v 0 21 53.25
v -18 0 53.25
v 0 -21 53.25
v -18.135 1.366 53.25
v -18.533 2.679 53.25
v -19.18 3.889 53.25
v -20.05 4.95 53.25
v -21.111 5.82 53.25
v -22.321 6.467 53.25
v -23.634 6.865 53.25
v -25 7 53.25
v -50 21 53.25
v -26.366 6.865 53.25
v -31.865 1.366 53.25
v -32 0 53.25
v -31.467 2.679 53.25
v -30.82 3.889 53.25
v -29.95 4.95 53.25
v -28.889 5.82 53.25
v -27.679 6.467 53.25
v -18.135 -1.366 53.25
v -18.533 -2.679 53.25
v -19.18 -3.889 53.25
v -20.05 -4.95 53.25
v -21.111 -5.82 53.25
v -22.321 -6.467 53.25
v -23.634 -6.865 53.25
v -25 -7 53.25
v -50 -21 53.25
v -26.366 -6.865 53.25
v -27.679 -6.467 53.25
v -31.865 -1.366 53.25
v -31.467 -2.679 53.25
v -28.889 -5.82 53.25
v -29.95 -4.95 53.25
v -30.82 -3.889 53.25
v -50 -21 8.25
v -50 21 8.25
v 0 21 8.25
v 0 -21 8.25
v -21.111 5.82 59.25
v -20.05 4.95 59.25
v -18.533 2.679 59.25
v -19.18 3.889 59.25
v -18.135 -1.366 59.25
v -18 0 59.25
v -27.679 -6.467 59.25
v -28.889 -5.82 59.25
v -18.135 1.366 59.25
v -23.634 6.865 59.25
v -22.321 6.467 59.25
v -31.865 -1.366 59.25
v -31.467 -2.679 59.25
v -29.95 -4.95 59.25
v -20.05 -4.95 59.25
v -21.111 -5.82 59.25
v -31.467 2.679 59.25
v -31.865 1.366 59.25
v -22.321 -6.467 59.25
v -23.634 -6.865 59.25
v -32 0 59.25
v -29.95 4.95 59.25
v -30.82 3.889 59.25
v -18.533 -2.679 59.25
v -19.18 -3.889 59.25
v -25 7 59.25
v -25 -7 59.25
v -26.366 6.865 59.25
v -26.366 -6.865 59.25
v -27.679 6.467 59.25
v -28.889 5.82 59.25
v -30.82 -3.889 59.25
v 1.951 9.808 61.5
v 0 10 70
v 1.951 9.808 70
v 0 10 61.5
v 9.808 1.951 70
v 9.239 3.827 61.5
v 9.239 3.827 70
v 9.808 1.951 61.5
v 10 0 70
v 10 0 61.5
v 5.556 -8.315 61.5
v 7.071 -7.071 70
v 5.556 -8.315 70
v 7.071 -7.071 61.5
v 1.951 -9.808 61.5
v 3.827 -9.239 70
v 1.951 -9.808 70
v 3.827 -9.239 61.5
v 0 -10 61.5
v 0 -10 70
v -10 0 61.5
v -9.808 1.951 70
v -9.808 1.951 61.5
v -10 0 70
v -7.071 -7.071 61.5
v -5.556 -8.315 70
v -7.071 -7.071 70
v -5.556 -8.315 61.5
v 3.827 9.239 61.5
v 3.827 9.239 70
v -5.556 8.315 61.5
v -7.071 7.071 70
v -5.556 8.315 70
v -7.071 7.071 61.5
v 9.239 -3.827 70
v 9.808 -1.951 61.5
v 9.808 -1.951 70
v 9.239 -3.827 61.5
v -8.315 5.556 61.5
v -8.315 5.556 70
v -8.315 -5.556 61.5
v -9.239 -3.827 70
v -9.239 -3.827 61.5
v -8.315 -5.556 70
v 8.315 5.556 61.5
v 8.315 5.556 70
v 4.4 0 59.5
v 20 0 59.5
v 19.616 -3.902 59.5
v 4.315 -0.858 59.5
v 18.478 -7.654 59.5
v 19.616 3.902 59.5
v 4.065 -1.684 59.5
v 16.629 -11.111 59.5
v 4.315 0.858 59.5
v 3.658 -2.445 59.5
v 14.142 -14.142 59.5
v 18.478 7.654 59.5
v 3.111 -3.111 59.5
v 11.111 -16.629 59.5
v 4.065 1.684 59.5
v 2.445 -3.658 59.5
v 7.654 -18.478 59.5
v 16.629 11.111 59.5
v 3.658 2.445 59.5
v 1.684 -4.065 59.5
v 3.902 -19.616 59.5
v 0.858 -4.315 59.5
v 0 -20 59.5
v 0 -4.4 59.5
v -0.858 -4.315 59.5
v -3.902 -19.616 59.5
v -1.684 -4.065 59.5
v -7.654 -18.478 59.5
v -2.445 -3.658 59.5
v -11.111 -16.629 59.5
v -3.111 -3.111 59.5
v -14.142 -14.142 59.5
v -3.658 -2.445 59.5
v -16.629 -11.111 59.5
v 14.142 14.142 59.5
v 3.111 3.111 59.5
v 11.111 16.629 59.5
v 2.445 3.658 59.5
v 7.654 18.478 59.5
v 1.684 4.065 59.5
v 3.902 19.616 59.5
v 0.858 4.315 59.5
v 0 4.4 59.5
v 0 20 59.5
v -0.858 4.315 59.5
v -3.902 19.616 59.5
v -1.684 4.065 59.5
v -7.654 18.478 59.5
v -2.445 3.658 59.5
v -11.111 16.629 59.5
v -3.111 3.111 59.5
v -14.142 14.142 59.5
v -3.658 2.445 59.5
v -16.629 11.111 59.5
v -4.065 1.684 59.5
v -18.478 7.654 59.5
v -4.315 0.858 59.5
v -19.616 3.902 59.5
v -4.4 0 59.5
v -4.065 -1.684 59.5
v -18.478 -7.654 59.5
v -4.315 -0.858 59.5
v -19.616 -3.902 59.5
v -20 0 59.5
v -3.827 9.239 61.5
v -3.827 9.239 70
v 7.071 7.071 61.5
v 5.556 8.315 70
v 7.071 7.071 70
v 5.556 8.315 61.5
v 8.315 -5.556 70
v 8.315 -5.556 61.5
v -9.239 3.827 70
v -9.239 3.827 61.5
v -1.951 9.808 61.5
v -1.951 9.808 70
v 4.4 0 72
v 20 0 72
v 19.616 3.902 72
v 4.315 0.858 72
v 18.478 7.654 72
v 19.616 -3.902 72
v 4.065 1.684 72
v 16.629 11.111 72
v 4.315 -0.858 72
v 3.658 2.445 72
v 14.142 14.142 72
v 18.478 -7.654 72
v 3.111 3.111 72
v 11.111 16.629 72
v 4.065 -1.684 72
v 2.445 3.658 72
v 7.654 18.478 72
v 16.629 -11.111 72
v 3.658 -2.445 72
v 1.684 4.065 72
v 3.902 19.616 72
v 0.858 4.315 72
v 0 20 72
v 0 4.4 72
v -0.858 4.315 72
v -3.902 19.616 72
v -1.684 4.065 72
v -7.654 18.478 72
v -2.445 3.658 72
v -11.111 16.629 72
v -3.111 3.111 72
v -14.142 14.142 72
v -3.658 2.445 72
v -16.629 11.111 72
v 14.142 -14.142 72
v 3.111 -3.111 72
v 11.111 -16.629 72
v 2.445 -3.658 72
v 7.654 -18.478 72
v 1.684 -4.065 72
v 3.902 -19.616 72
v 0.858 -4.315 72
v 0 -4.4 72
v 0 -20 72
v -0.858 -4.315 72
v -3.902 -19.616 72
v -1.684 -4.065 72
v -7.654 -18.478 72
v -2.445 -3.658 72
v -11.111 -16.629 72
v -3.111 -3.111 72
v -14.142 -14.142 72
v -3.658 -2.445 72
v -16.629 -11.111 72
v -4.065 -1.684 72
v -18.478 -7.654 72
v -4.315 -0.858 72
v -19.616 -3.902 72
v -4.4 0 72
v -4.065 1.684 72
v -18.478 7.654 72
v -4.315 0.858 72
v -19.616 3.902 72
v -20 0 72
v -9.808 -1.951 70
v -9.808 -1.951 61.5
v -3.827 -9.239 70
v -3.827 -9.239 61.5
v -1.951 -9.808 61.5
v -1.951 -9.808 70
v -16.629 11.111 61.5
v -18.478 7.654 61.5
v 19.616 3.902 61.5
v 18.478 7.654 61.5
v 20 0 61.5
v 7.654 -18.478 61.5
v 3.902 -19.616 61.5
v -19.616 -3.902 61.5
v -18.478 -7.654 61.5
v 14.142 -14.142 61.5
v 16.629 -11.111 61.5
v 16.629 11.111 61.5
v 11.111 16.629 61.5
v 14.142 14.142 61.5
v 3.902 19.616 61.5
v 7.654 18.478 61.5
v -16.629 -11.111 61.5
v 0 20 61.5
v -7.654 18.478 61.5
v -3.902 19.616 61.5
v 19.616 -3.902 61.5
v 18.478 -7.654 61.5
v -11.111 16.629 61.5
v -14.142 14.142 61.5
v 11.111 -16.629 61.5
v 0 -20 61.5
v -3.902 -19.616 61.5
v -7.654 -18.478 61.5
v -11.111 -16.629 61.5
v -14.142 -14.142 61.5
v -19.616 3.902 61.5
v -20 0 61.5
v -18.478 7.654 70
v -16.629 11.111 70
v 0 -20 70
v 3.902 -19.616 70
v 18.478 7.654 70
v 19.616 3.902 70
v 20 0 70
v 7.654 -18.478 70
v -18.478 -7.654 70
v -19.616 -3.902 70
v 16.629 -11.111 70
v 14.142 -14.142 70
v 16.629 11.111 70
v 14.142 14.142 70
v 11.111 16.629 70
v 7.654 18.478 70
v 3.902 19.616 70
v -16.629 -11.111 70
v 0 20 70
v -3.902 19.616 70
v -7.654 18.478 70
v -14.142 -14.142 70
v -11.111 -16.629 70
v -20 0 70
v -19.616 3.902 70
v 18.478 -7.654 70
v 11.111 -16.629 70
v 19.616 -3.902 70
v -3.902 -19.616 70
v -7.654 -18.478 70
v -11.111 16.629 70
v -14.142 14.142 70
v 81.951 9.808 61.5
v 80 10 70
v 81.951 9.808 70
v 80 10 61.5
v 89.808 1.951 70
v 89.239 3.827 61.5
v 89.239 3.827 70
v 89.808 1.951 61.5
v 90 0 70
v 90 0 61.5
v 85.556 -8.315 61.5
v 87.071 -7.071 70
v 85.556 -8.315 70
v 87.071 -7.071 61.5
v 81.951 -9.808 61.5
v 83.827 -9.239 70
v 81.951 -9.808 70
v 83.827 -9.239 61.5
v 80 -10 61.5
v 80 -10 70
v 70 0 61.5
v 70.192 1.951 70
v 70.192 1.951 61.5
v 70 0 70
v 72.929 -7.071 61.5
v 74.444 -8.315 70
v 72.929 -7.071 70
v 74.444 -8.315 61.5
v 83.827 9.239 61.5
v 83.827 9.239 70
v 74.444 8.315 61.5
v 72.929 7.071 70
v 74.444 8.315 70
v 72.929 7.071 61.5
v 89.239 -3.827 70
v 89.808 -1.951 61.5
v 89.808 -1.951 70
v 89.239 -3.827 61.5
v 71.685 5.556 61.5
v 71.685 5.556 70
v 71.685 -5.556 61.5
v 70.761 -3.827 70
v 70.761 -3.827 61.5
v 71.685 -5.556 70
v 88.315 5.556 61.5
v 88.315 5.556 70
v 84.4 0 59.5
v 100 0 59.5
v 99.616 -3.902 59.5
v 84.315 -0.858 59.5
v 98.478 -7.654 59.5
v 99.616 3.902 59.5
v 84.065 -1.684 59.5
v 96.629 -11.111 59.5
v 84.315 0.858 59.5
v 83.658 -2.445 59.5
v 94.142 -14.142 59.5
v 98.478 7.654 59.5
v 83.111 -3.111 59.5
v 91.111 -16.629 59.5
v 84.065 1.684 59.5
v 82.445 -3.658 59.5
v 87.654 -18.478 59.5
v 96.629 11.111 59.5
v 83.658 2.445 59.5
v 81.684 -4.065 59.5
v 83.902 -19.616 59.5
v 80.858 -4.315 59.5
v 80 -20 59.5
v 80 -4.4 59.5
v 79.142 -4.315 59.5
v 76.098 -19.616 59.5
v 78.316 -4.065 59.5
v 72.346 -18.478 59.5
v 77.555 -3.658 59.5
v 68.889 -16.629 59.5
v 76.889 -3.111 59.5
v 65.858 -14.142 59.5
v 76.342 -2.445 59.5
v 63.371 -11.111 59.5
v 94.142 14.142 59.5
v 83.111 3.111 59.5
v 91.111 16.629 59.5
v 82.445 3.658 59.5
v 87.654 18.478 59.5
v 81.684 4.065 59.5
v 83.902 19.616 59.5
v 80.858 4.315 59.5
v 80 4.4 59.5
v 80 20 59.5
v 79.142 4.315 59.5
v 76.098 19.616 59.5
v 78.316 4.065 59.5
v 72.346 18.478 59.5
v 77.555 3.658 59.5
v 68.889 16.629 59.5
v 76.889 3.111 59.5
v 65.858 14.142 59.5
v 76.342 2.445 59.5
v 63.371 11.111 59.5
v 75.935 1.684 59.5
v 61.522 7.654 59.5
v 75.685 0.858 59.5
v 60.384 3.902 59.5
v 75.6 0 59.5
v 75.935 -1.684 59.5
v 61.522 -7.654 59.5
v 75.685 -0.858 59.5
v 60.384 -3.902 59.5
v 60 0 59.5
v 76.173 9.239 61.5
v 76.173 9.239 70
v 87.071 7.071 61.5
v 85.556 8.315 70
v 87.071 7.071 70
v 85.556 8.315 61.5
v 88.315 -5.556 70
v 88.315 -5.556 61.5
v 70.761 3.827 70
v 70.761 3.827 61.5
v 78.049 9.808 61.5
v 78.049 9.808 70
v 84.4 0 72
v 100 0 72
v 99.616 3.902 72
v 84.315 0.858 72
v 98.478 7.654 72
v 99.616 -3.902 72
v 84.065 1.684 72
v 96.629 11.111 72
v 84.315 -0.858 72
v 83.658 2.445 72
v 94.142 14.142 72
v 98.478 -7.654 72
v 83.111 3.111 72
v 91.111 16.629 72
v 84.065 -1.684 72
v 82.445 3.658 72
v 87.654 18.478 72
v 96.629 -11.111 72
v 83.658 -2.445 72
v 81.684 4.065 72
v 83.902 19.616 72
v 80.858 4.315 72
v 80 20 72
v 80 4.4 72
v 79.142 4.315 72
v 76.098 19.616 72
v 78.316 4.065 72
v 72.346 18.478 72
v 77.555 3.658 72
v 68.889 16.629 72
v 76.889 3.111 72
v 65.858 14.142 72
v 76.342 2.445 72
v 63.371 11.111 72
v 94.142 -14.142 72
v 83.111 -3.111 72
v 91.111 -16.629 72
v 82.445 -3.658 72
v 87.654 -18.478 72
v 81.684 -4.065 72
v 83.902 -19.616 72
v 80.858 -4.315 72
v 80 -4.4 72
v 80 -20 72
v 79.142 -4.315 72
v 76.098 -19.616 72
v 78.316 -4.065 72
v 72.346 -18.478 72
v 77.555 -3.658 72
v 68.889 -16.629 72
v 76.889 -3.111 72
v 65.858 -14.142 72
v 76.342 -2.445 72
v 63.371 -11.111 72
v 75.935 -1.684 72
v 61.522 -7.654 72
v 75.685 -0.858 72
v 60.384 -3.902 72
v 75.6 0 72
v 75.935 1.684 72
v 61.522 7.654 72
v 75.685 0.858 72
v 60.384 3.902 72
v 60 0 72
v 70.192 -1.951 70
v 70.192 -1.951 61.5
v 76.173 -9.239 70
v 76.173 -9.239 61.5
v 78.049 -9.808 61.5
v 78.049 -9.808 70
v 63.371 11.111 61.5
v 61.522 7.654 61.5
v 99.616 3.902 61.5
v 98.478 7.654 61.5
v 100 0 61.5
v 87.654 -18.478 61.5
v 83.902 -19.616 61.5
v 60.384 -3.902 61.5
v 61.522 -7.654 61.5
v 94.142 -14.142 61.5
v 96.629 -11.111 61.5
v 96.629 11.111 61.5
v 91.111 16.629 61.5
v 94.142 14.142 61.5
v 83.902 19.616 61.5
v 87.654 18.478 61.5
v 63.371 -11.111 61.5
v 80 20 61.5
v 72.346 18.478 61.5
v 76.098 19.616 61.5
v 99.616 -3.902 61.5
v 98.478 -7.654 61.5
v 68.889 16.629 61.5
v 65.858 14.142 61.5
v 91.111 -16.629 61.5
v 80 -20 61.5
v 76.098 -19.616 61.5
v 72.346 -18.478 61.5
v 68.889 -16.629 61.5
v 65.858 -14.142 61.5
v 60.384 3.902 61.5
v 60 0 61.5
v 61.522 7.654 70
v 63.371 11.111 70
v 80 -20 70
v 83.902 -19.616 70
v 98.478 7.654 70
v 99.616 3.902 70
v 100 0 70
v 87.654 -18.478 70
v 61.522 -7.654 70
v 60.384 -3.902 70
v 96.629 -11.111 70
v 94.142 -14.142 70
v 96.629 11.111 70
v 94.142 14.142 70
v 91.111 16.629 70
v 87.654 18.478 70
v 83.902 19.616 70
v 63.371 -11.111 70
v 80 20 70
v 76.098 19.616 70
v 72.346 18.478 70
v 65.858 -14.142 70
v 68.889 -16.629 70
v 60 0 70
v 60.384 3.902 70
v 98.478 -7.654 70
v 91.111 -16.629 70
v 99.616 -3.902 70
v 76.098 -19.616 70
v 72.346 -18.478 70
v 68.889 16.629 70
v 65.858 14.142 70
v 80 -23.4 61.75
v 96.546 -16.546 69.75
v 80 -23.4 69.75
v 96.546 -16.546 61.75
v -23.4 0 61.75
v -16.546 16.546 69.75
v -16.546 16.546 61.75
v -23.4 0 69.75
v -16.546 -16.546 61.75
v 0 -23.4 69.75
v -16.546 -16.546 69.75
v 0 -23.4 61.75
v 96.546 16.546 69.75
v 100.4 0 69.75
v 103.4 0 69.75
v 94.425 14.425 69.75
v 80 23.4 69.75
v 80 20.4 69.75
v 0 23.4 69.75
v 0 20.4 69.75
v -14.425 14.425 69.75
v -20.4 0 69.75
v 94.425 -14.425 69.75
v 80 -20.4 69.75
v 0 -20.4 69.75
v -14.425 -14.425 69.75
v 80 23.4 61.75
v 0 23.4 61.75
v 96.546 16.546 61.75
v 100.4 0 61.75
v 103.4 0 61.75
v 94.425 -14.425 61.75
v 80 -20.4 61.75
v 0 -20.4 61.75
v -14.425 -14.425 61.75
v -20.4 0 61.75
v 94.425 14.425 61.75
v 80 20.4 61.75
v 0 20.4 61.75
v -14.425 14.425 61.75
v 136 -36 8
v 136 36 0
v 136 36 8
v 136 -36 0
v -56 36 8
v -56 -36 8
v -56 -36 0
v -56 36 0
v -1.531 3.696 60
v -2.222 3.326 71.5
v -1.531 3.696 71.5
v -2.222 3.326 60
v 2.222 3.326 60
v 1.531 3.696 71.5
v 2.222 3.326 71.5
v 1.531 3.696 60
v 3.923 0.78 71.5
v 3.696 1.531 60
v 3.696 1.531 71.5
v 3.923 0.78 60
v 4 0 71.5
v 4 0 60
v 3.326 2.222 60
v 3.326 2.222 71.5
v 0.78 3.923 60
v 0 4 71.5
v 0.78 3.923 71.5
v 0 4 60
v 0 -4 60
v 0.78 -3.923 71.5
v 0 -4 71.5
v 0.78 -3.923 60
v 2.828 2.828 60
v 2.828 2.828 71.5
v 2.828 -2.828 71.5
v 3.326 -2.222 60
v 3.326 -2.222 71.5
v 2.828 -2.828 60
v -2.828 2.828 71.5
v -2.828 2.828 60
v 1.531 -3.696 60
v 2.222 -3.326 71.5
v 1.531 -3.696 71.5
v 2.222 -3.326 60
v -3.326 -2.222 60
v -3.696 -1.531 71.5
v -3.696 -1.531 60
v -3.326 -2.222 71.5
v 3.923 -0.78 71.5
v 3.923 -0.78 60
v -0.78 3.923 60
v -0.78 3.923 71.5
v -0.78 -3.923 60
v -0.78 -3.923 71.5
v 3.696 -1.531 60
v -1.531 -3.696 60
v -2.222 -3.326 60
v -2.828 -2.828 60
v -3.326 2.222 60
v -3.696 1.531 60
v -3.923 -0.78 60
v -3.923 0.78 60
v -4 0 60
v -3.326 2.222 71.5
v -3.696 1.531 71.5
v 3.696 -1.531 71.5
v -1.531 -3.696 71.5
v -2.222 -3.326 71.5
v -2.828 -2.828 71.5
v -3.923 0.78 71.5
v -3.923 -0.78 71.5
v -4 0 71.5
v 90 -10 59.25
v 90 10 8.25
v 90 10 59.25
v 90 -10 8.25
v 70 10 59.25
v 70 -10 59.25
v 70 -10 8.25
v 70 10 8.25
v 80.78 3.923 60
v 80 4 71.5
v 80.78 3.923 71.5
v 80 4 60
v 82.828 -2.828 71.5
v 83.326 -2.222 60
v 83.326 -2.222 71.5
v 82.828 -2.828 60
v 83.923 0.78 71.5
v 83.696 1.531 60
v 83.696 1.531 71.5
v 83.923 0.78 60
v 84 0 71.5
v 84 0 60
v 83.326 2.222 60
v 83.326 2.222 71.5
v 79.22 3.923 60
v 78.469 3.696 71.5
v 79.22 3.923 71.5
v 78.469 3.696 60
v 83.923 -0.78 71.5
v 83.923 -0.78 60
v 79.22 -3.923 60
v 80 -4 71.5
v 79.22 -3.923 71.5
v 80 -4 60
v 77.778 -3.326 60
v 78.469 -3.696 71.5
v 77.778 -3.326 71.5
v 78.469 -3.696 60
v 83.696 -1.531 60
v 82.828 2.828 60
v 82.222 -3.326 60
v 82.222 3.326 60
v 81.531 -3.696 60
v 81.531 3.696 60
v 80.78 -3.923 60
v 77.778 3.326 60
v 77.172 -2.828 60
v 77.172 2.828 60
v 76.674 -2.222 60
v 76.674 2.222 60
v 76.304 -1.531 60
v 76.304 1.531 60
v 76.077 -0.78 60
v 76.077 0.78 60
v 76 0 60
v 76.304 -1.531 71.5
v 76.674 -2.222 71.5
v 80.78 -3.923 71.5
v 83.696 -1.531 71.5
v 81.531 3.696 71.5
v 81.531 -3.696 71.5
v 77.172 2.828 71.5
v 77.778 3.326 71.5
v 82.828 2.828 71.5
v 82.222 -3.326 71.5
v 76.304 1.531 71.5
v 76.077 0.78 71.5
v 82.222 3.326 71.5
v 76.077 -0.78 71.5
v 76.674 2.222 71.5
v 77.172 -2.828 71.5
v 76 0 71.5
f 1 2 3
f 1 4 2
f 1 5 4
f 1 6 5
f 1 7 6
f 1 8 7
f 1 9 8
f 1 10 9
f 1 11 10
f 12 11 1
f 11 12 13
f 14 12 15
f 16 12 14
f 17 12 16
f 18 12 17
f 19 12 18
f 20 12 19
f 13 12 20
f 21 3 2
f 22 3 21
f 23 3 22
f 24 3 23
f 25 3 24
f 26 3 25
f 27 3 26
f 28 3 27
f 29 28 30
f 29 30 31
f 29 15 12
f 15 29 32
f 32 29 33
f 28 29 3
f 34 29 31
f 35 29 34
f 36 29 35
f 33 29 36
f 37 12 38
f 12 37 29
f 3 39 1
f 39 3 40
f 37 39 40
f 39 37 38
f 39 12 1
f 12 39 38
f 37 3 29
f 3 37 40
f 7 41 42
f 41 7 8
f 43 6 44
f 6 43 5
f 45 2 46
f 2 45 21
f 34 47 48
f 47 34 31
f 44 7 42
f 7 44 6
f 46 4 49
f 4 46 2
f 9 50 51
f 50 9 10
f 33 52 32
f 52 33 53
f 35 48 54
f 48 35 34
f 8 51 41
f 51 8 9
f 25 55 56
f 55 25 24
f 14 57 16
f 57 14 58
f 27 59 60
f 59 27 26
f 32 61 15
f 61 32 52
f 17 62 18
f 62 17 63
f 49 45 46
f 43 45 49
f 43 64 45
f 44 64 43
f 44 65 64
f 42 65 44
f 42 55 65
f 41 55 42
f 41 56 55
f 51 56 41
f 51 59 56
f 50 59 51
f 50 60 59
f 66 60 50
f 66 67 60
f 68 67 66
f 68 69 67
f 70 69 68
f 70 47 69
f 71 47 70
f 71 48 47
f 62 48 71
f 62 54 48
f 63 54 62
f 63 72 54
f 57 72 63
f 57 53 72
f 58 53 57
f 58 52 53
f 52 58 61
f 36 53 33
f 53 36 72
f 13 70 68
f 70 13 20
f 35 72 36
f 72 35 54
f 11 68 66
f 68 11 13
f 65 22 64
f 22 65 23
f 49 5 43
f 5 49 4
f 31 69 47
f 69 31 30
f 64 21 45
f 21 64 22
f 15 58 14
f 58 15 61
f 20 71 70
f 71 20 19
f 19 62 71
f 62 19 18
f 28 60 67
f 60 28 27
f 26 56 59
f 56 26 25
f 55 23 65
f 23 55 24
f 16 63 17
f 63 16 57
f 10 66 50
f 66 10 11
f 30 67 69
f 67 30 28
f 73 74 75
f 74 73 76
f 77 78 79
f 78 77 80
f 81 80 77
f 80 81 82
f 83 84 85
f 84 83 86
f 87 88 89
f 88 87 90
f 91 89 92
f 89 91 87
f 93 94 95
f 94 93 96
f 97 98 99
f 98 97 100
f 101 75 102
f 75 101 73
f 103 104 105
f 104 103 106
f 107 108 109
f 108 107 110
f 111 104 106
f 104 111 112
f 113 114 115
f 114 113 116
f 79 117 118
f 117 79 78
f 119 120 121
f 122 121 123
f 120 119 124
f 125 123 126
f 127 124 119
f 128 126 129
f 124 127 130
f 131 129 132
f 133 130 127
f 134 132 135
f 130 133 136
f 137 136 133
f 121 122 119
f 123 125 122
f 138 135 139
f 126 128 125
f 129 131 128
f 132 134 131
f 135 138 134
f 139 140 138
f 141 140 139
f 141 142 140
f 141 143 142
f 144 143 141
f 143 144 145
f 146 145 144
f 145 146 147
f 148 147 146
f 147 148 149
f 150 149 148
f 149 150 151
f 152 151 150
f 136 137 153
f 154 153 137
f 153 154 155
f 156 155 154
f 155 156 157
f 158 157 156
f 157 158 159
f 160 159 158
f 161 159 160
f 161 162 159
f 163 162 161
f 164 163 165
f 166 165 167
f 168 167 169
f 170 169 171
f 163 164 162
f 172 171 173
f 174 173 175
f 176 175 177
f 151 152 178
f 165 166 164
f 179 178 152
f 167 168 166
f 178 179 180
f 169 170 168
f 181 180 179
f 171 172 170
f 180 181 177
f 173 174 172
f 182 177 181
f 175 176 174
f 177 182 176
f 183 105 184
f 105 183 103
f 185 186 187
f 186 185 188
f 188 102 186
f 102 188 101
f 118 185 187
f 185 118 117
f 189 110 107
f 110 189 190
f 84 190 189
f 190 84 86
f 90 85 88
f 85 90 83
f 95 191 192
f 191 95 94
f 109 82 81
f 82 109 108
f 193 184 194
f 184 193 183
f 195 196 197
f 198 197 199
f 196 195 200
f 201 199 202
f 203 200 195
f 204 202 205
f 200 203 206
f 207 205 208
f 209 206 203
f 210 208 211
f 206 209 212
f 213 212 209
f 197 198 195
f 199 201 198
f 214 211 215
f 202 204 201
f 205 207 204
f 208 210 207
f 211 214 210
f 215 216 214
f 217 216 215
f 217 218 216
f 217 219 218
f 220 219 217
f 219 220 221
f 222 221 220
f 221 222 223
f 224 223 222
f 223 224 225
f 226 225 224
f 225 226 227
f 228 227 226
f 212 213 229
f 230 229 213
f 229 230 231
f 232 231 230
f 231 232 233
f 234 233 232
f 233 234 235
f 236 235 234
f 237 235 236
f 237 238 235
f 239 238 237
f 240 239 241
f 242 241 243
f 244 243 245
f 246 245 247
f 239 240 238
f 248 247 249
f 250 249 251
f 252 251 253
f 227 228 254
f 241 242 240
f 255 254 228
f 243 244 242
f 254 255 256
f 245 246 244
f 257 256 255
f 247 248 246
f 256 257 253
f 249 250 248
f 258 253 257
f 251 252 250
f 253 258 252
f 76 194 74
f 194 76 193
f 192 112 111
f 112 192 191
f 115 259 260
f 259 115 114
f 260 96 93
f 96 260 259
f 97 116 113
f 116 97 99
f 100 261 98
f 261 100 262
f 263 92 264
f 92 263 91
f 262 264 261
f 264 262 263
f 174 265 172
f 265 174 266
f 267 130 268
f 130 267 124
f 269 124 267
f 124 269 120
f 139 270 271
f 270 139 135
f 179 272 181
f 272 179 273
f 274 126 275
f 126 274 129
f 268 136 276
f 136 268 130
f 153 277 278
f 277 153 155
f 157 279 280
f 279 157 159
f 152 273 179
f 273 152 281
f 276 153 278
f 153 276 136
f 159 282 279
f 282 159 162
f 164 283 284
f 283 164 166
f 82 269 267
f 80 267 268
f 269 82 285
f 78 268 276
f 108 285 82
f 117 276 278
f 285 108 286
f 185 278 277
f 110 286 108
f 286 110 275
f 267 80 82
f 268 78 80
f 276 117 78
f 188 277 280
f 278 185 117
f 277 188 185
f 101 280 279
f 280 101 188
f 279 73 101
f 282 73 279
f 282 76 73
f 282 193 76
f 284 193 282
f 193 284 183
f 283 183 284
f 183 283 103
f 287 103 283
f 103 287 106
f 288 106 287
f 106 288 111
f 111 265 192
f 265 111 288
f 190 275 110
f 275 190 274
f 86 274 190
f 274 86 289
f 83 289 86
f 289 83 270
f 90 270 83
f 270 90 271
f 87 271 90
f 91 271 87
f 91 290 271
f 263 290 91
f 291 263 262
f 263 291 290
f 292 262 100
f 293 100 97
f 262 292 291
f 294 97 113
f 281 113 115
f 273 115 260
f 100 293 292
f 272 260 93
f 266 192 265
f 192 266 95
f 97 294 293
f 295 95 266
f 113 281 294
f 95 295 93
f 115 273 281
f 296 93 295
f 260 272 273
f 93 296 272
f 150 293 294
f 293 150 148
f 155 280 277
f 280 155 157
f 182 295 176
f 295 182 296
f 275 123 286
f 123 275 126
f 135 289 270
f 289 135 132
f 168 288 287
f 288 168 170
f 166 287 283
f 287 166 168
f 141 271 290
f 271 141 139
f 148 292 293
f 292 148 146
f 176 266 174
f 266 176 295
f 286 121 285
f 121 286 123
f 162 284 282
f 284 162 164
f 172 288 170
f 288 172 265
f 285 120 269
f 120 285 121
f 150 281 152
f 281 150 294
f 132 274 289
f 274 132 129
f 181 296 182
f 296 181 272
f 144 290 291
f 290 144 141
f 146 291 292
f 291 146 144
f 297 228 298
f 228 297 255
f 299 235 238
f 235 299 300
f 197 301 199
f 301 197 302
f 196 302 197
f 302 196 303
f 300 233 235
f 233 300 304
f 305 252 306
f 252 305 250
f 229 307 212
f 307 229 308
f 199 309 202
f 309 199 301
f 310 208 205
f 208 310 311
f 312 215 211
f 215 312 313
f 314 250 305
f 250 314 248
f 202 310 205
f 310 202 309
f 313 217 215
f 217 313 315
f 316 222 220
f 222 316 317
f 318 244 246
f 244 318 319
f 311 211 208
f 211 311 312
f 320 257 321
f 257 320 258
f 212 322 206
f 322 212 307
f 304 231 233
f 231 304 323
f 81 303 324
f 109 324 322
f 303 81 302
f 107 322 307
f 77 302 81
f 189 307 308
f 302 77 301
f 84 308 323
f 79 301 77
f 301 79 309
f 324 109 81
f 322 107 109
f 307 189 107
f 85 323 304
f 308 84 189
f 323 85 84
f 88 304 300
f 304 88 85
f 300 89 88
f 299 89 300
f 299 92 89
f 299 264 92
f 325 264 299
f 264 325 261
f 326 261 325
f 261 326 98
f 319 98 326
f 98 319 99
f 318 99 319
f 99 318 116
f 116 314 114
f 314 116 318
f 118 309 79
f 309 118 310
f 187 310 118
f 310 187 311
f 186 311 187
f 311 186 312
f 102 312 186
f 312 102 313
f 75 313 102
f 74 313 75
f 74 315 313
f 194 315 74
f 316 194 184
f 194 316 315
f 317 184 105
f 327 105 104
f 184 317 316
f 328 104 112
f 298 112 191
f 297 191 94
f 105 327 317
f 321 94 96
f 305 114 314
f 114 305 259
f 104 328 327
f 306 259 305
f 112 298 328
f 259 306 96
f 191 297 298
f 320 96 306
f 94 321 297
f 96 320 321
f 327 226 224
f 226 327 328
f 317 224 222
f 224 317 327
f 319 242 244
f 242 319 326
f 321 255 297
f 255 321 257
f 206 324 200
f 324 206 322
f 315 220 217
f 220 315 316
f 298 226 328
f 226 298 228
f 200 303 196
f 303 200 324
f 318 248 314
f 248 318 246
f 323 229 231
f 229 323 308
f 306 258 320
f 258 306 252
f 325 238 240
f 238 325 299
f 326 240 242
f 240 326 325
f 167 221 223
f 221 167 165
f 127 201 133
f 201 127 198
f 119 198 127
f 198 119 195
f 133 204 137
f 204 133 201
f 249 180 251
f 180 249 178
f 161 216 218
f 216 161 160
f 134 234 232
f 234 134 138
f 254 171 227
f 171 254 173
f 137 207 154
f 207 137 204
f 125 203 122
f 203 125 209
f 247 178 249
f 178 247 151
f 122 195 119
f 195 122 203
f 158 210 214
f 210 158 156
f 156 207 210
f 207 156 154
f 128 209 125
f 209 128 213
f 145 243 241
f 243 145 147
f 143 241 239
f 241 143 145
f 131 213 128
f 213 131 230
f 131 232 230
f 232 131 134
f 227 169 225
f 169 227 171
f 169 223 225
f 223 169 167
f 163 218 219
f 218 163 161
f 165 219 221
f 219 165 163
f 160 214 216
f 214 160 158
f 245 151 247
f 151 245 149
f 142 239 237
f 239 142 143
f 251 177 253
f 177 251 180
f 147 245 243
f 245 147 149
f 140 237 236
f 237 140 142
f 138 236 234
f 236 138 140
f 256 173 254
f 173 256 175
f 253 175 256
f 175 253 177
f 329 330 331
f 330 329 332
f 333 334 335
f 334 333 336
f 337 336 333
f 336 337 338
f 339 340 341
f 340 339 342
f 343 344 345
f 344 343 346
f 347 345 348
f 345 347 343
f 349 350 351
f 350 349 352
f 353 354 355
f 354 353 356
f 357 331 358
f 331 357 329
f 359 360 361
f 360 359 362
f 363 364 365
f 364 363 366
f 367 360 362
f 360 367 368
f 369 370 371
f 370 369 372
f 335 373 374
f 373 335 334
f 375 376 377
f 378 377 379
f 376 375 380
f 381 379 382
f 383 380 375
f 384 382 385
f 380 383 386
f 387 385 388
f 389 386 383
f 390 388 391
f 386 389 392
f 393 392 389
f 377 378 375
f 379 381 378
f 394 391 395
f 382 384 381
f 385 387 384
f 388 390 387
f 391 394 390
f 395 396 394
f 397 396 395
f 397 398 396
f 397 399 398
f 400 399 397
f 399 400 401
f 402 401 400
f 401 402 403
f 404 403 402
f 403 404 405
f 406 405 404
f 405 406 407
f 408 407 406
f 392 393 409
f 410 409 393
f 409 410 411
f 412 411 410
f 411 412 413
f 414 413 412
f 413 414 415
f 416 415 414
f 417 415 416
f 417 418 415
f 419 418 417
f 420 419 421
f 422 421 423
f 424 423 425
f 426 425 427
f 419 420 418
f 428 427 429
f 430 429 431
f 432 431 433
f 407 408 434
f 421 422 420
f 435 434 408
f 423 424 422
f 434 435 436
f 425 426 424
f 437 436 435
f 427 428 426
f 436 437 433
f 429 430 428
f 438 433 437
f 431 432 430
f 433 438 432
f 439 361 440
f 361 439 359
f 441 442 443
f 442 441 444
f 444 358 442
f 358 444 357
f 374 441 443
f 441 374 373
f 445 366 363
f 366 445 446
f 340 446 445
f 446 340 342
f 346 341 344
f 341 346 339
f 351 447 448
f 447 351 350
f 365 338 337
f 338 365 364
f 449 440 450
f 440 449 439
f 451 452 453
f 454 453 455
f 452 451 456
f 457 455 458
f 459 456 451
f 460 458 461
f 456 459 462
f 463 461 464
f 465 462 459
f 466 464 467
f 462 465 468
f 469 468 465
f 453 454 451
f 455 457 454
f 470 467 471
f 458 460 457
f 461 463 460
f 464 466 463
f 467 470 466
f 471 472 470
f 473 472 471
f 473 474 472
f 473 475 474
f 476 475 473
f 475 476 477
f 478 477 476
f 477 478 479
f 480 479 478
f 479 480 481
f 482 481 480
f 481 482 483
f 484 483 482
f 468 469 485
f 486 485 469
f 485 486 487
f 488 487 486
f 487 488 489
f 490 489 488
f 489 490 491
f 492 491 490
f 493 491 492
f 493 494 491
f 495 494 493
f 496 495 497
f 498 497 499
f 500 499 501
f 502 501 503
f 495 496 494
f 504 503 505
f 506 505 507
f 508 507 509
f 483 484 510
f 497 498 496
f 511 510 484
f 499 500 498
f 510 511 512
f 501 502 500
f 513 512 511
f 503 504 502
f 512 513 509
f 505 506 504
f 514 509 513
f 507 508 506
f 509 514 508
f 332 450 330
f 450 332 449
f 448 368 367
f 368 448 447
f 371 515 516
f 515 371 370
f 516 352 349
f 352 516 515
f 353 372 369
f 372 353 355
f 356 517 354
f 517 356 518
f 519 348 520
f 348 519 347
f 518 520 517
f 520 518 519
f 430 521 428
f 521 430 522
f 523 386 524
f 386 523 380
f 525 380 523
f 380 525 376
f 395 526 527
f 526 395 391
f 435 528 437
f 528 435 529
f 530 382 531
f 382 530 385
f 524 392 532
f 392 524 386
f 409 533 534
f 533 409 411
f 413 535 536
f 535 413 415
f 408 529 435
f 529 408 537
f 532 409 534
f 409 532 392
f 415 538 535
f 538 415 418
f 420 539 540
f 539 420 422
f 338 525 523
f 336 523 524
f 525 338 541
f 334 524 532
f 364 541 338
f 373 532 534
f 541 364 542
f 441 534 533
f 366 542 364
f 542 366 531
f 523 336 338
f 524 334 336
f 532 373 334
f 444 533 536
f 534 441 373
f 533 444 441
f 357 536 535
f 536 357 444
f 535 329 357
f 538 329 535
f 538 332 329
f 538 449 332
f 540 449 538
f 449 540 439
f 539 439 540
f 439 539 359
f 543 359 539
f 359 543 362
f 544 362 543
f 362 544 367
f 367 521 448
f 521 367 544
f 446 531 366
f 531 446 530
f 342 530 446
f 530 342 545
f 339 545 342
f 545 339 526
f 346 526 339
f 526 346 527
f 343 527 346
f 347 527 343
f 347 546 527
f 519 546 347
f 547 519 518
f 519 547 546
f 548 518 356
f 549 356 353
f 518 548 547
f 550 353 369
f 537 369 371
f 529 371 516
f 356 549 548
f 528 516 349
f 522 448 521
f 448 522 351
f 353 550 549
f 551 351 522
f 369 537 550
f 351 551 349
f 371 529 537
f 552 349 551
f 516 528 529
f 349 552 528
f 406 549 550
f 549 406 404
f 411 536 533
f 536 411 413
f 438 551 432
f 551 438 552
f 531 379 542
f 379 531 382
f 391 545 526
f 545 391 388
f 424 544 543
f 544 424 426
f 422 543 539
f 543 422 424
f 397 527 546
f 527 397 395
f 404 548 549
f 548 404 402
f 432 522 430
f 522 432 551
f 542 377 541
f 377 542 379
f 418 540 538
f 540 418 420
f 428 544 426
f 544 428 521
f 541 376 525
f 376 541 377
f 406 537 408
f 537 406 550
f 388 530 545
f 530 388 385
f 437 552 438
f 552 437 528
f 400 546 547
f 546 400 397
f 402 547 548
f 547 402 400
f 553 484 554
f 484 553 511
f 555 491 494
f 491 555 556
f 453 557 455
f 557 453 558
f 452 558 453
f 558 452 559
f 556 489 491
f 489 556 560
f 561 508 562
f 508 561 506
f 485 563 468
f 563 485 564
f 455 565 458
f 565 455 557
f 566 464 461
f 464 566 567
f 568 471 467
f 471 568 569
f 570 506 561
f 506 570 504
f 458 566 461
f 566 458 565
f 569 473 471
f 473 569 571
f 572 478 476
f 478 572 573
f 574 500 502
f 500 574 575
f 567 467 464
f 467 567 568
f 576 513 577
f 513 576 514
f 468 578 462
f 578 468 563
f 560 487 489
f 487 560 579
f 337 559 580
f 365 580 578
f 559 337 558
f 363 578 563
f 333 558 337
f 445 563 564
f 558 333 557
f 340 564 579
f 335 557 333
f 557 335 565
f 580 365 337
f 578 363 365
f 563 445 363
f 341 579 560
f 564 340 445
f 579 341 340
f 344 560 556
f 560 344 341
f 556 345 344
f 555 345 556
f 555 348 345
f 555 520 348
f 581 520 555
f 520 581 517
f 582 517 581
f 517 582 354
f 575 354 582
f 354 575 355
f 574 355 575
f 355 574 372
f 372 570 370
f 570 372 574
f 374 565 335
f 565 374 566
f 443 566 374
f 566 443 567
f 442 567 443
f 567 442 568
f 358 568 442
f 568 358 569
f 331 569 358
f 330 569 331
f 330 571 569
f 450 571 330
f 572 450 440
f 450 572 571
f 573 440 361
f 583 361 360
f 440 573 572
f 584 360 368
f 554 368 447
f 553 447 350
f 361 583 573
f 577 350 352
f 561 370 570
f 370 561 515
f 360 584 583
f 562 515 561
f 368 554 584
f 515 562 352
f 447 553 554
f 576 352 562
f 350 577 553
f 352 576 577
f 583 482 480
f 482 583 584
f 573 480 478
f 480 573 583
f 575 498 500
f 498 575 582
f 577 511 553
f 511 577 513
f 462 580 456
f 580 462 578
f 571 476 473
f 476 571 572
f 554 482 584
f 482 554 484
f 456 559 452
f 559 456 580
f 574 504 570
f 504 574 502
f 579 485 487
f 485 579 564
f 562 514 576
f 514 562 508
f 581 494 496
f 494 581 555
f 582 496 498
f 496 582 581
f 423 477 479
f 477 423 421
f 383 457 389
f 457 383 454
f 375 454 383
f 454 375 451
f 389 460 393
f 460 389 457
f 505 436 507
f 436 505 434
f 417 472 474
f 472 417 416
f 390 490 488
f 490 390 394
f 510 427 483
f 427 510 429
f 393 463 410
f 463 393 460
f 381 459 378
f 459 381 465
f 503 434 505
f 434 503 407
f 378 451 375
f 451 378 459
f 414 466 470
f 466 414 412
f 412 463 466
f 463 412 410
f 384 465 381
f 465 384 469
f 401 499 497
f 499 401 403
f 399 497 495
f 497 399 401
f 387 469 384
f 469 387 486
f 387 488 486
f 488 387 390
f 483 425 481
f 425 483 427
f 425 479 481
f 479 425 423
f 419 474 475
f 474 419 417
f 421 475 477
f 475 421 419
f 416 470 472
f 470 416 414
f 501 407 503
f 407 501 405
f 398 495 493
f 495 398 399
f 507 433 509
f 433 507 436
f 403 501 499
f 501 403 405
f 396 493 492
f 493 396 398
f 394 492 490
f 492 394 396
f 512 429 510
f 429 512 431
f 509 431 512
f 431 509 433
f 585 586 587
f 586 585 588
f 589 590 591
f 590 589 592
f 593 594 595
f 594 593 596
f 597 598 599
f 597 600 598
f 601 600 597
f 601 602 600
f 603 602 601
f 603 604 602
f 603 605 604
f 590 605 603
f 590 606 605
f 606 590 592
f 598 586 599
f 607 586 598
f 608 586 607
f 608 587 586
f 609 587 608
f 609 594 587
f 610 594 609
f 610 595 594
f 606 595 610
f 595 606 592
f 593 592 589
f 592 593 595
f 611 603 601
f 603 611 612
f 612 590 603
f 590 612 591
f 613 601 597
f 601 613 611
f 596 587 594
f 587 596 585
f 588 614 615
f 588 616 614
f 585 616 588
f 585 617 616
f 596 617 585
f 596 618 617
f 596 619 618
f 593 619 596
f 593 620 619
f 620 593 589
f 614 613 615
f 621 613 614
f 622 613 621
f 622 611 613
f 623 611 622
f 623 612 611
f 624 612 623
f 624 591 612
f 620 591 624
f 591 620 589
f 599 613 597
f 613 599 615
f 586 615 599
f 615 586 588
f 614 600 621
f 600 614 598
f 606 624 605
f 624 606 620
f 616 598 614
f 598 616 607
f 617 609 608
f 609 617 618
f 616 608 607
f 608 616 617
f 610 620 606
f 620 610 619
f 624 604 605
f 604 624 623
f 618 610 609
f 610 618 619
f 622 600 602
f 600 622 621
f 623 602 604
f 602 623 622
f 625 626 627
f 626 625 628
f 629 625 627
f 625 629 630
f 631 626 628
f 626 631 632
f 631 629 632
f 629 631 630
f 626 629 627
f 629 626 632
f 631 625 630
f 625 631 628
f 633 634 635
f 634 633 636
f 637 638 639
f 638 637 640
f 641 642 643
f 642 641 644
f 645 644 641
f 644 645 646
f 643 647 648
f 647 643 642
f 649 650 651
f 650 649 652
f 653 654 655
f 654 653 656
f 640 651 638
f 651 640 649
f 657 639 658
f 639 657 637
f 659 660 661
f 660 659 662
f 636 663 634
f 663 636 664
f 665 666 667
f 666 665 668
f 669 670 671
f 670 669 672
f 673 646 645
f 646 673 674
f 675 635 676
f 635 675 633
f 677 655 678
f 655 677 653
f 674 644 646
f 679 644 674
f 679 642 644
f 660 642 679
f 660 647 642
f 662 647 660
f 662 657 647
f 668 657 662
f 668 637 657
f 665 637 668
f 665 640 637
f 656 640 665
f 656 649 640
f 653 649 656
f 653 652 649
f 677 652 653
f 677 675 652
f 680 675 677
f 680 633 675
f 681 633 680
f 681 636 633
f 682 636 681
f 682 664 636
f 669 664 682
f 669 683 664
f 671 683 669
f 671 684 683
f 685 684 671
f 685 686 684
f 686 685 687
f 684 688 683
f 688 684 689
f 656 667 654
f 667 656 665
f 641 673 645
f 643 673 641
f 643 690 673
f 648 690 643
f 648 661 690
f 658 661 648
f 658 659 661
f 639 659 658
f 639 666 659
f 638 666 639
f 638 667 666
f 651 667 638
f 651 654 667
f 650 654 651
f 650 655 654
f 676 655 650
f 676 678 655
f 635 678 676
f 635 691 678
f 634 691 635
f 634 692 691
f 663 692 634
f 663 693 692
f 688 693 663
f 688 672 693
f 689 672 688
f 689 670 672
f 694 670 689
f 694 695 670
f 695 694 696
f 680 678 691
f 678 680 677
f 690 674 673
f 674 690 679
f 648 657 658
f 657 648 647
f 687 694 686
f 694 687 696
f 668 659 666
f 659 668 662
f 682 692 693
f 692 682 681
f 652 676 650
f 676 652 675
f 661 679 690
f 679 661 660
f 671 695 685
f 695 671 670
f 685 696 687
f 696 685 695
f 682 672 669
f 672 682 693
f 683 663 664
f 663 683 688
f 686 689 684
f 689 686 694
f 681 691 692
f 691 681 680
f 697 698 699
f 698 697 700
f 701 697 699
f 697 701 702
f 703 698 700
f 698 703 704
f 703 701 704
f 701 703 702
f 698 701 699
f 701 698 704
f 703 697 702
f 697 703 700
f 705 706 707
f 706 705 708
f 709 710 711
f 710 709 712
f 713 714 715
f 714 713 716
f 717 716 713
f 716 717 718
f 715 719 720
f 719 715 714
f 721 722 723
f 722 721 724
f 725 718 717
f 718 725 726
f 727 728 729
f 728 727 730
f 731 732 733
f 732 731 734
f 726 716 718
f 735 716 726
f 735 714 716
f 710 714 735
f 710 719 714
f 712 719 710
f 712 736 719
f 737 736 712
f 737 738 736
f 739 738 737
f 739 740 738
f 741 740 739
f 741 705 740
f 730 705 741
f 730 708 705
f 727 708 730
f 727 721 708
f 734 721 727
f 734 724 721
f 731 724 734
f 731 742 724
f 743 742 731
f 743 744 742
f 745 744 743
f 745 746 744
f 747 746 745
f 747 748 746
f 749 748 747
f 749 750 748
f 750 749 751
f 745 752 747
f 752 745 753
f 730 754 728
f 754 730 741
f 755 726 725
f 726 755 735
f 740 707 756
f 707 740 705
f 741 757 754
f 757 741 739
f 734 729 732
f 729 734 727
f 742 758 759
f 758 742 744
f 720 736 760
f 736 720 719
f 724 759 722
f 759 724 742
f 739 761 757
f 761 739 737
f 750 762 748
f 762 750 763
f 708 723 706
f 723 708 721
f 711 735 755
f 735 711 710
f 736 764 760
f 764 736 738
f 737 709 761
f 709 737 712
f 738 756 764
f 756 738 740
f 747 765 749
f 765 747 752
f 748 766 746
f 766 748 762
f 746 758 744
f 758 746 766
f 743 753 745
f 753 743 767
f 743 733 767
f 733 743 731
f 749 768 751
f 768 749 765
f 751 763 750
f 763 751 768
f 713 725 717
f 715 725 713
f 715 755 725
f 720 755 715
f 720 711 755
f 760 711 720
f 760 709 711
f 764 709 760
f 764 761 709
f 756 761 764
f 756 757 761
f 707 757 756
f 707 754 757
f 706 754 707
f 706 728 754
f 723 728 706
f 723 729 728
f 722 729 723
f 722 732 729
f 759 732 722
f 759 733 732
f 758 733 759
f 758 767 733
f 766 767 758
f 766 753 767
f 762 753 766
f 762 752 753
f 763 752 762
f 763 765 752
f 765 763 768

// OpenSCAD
$fn = 32;

// ------------------------------------------------------------------------
// Motor belt drive: span 80 mm, pulleys d40, belt 8 mm wide
// Every part is its own module, assembly() places every instance.
// ------------------------------------------------------------------------

// --- part 1 ---
module base_plate() {
  difference() {
    translate([-96, -36, 0]) cube([192, 72, 8]);
  }
}

// --- part 2 ---
module motor() {
  union() {
    translate([-22.5, -21, 0]) cube([45, 42, 50]);
    translate([25.5, 0, 25]) rotate([0, 90, 0]) cylinder(h = 6, d = 14, center = true);
  }
}

// --- part 3 ---
module drive_shaft() {
  translate([0, 0, -5.75]) cylinder(h = 11.5, d = 8);
}

// --- part 4 ---
module pulley_drive() {
  difference() {
    union() {
      cylinder(h = 12.5, d = 20);
      cylinder(h = 2, d = 40);
      translate([0, 0, 10.5]) cylinder(h = 2, d = 40);
    }
    translate([0, 0, -1]) cylinder(h = 14.5, d = 8.8);
  }
}

// --- part 5 ---
module idler_post() {
  translate([-10, -10, 0]) cube([20, 20, 51]);
}

// --- part 6 ---
module driven_shaft() {
  translate([0, 0, -5.75]) cylinder(h = 11.5, d = 8);
}

// --- part 7 ---
module pulley_driven() {
  difference() {
    union() {
      cylinder(h = 12.5, d = 20);
      cylinder(h = 2, d = 40);
      translate([0, 0, 10.5]) cylinder(h = 2, d = 40);
    }
    translate([0, 0, -1]) cylinder(h = 14.5, d = 8.8);
  }
}

// --- part 8 ---
module drive_belt() {
  difference() {
    linear_extrude(height = 8) polygon(points = concat([for (a = [90 : 45 : 270]) [23.4 * cos(a), 23.4 * sin(a)]], [for (a = [270 : 45 : 450]) [80 + 23.4 * cos(a), 23.4 * sin(a)]]));
    translate([0, 0, -1]) linear_extrude(height = 10) polygon(points = concat([for (a = [90 : 45 : 270]) [20.4 * cos(a), 20.4 * sin(a)]], [for (a = [270 : 45 : 450]) [80 + 20.4 * cos(a), 20.4 * sin(a)]]));
  }
}

// --- assembly ---
module assembly() {
  color([0.80, 0.24, 0.20]) translate([40, 0, 0]) rotate([0, 0, 0]) base_plate();
  color([0.20, 0.45, 0.75]) translate([0, 0, 30.75]) rotate([0, 270, 0]) motor();
  color([0.25, 0.62, 0.32]) translate([0, 0, 65.75]) rotate([0, 0, 0]) drive_shaft();
  color([0.92, 0.70, 0.18]) translate([0, 0, 59.5]) rotate([0, 0, 0]) pulley_drive();
  color([0.58, 0.35, 0.70]) translate([80, 0, 8.25]) rotate([0, 0, 0]) idler_post();
  color([0.16, 0.66, 0.66]) translate([80, 0, 65.75]) rotate([0, 0, 0]) driven_shaft();
  color([0.85, 0.48, 0.18]) translate([80, 0, 59.5]) rotate([0, 0, 0]) pulley_driven();
  color([0.55, 0.60, 0.65]) translate([0, 0, 61.75]) rotate([0, 0, 0]) drive_belt();
}

assembly();
